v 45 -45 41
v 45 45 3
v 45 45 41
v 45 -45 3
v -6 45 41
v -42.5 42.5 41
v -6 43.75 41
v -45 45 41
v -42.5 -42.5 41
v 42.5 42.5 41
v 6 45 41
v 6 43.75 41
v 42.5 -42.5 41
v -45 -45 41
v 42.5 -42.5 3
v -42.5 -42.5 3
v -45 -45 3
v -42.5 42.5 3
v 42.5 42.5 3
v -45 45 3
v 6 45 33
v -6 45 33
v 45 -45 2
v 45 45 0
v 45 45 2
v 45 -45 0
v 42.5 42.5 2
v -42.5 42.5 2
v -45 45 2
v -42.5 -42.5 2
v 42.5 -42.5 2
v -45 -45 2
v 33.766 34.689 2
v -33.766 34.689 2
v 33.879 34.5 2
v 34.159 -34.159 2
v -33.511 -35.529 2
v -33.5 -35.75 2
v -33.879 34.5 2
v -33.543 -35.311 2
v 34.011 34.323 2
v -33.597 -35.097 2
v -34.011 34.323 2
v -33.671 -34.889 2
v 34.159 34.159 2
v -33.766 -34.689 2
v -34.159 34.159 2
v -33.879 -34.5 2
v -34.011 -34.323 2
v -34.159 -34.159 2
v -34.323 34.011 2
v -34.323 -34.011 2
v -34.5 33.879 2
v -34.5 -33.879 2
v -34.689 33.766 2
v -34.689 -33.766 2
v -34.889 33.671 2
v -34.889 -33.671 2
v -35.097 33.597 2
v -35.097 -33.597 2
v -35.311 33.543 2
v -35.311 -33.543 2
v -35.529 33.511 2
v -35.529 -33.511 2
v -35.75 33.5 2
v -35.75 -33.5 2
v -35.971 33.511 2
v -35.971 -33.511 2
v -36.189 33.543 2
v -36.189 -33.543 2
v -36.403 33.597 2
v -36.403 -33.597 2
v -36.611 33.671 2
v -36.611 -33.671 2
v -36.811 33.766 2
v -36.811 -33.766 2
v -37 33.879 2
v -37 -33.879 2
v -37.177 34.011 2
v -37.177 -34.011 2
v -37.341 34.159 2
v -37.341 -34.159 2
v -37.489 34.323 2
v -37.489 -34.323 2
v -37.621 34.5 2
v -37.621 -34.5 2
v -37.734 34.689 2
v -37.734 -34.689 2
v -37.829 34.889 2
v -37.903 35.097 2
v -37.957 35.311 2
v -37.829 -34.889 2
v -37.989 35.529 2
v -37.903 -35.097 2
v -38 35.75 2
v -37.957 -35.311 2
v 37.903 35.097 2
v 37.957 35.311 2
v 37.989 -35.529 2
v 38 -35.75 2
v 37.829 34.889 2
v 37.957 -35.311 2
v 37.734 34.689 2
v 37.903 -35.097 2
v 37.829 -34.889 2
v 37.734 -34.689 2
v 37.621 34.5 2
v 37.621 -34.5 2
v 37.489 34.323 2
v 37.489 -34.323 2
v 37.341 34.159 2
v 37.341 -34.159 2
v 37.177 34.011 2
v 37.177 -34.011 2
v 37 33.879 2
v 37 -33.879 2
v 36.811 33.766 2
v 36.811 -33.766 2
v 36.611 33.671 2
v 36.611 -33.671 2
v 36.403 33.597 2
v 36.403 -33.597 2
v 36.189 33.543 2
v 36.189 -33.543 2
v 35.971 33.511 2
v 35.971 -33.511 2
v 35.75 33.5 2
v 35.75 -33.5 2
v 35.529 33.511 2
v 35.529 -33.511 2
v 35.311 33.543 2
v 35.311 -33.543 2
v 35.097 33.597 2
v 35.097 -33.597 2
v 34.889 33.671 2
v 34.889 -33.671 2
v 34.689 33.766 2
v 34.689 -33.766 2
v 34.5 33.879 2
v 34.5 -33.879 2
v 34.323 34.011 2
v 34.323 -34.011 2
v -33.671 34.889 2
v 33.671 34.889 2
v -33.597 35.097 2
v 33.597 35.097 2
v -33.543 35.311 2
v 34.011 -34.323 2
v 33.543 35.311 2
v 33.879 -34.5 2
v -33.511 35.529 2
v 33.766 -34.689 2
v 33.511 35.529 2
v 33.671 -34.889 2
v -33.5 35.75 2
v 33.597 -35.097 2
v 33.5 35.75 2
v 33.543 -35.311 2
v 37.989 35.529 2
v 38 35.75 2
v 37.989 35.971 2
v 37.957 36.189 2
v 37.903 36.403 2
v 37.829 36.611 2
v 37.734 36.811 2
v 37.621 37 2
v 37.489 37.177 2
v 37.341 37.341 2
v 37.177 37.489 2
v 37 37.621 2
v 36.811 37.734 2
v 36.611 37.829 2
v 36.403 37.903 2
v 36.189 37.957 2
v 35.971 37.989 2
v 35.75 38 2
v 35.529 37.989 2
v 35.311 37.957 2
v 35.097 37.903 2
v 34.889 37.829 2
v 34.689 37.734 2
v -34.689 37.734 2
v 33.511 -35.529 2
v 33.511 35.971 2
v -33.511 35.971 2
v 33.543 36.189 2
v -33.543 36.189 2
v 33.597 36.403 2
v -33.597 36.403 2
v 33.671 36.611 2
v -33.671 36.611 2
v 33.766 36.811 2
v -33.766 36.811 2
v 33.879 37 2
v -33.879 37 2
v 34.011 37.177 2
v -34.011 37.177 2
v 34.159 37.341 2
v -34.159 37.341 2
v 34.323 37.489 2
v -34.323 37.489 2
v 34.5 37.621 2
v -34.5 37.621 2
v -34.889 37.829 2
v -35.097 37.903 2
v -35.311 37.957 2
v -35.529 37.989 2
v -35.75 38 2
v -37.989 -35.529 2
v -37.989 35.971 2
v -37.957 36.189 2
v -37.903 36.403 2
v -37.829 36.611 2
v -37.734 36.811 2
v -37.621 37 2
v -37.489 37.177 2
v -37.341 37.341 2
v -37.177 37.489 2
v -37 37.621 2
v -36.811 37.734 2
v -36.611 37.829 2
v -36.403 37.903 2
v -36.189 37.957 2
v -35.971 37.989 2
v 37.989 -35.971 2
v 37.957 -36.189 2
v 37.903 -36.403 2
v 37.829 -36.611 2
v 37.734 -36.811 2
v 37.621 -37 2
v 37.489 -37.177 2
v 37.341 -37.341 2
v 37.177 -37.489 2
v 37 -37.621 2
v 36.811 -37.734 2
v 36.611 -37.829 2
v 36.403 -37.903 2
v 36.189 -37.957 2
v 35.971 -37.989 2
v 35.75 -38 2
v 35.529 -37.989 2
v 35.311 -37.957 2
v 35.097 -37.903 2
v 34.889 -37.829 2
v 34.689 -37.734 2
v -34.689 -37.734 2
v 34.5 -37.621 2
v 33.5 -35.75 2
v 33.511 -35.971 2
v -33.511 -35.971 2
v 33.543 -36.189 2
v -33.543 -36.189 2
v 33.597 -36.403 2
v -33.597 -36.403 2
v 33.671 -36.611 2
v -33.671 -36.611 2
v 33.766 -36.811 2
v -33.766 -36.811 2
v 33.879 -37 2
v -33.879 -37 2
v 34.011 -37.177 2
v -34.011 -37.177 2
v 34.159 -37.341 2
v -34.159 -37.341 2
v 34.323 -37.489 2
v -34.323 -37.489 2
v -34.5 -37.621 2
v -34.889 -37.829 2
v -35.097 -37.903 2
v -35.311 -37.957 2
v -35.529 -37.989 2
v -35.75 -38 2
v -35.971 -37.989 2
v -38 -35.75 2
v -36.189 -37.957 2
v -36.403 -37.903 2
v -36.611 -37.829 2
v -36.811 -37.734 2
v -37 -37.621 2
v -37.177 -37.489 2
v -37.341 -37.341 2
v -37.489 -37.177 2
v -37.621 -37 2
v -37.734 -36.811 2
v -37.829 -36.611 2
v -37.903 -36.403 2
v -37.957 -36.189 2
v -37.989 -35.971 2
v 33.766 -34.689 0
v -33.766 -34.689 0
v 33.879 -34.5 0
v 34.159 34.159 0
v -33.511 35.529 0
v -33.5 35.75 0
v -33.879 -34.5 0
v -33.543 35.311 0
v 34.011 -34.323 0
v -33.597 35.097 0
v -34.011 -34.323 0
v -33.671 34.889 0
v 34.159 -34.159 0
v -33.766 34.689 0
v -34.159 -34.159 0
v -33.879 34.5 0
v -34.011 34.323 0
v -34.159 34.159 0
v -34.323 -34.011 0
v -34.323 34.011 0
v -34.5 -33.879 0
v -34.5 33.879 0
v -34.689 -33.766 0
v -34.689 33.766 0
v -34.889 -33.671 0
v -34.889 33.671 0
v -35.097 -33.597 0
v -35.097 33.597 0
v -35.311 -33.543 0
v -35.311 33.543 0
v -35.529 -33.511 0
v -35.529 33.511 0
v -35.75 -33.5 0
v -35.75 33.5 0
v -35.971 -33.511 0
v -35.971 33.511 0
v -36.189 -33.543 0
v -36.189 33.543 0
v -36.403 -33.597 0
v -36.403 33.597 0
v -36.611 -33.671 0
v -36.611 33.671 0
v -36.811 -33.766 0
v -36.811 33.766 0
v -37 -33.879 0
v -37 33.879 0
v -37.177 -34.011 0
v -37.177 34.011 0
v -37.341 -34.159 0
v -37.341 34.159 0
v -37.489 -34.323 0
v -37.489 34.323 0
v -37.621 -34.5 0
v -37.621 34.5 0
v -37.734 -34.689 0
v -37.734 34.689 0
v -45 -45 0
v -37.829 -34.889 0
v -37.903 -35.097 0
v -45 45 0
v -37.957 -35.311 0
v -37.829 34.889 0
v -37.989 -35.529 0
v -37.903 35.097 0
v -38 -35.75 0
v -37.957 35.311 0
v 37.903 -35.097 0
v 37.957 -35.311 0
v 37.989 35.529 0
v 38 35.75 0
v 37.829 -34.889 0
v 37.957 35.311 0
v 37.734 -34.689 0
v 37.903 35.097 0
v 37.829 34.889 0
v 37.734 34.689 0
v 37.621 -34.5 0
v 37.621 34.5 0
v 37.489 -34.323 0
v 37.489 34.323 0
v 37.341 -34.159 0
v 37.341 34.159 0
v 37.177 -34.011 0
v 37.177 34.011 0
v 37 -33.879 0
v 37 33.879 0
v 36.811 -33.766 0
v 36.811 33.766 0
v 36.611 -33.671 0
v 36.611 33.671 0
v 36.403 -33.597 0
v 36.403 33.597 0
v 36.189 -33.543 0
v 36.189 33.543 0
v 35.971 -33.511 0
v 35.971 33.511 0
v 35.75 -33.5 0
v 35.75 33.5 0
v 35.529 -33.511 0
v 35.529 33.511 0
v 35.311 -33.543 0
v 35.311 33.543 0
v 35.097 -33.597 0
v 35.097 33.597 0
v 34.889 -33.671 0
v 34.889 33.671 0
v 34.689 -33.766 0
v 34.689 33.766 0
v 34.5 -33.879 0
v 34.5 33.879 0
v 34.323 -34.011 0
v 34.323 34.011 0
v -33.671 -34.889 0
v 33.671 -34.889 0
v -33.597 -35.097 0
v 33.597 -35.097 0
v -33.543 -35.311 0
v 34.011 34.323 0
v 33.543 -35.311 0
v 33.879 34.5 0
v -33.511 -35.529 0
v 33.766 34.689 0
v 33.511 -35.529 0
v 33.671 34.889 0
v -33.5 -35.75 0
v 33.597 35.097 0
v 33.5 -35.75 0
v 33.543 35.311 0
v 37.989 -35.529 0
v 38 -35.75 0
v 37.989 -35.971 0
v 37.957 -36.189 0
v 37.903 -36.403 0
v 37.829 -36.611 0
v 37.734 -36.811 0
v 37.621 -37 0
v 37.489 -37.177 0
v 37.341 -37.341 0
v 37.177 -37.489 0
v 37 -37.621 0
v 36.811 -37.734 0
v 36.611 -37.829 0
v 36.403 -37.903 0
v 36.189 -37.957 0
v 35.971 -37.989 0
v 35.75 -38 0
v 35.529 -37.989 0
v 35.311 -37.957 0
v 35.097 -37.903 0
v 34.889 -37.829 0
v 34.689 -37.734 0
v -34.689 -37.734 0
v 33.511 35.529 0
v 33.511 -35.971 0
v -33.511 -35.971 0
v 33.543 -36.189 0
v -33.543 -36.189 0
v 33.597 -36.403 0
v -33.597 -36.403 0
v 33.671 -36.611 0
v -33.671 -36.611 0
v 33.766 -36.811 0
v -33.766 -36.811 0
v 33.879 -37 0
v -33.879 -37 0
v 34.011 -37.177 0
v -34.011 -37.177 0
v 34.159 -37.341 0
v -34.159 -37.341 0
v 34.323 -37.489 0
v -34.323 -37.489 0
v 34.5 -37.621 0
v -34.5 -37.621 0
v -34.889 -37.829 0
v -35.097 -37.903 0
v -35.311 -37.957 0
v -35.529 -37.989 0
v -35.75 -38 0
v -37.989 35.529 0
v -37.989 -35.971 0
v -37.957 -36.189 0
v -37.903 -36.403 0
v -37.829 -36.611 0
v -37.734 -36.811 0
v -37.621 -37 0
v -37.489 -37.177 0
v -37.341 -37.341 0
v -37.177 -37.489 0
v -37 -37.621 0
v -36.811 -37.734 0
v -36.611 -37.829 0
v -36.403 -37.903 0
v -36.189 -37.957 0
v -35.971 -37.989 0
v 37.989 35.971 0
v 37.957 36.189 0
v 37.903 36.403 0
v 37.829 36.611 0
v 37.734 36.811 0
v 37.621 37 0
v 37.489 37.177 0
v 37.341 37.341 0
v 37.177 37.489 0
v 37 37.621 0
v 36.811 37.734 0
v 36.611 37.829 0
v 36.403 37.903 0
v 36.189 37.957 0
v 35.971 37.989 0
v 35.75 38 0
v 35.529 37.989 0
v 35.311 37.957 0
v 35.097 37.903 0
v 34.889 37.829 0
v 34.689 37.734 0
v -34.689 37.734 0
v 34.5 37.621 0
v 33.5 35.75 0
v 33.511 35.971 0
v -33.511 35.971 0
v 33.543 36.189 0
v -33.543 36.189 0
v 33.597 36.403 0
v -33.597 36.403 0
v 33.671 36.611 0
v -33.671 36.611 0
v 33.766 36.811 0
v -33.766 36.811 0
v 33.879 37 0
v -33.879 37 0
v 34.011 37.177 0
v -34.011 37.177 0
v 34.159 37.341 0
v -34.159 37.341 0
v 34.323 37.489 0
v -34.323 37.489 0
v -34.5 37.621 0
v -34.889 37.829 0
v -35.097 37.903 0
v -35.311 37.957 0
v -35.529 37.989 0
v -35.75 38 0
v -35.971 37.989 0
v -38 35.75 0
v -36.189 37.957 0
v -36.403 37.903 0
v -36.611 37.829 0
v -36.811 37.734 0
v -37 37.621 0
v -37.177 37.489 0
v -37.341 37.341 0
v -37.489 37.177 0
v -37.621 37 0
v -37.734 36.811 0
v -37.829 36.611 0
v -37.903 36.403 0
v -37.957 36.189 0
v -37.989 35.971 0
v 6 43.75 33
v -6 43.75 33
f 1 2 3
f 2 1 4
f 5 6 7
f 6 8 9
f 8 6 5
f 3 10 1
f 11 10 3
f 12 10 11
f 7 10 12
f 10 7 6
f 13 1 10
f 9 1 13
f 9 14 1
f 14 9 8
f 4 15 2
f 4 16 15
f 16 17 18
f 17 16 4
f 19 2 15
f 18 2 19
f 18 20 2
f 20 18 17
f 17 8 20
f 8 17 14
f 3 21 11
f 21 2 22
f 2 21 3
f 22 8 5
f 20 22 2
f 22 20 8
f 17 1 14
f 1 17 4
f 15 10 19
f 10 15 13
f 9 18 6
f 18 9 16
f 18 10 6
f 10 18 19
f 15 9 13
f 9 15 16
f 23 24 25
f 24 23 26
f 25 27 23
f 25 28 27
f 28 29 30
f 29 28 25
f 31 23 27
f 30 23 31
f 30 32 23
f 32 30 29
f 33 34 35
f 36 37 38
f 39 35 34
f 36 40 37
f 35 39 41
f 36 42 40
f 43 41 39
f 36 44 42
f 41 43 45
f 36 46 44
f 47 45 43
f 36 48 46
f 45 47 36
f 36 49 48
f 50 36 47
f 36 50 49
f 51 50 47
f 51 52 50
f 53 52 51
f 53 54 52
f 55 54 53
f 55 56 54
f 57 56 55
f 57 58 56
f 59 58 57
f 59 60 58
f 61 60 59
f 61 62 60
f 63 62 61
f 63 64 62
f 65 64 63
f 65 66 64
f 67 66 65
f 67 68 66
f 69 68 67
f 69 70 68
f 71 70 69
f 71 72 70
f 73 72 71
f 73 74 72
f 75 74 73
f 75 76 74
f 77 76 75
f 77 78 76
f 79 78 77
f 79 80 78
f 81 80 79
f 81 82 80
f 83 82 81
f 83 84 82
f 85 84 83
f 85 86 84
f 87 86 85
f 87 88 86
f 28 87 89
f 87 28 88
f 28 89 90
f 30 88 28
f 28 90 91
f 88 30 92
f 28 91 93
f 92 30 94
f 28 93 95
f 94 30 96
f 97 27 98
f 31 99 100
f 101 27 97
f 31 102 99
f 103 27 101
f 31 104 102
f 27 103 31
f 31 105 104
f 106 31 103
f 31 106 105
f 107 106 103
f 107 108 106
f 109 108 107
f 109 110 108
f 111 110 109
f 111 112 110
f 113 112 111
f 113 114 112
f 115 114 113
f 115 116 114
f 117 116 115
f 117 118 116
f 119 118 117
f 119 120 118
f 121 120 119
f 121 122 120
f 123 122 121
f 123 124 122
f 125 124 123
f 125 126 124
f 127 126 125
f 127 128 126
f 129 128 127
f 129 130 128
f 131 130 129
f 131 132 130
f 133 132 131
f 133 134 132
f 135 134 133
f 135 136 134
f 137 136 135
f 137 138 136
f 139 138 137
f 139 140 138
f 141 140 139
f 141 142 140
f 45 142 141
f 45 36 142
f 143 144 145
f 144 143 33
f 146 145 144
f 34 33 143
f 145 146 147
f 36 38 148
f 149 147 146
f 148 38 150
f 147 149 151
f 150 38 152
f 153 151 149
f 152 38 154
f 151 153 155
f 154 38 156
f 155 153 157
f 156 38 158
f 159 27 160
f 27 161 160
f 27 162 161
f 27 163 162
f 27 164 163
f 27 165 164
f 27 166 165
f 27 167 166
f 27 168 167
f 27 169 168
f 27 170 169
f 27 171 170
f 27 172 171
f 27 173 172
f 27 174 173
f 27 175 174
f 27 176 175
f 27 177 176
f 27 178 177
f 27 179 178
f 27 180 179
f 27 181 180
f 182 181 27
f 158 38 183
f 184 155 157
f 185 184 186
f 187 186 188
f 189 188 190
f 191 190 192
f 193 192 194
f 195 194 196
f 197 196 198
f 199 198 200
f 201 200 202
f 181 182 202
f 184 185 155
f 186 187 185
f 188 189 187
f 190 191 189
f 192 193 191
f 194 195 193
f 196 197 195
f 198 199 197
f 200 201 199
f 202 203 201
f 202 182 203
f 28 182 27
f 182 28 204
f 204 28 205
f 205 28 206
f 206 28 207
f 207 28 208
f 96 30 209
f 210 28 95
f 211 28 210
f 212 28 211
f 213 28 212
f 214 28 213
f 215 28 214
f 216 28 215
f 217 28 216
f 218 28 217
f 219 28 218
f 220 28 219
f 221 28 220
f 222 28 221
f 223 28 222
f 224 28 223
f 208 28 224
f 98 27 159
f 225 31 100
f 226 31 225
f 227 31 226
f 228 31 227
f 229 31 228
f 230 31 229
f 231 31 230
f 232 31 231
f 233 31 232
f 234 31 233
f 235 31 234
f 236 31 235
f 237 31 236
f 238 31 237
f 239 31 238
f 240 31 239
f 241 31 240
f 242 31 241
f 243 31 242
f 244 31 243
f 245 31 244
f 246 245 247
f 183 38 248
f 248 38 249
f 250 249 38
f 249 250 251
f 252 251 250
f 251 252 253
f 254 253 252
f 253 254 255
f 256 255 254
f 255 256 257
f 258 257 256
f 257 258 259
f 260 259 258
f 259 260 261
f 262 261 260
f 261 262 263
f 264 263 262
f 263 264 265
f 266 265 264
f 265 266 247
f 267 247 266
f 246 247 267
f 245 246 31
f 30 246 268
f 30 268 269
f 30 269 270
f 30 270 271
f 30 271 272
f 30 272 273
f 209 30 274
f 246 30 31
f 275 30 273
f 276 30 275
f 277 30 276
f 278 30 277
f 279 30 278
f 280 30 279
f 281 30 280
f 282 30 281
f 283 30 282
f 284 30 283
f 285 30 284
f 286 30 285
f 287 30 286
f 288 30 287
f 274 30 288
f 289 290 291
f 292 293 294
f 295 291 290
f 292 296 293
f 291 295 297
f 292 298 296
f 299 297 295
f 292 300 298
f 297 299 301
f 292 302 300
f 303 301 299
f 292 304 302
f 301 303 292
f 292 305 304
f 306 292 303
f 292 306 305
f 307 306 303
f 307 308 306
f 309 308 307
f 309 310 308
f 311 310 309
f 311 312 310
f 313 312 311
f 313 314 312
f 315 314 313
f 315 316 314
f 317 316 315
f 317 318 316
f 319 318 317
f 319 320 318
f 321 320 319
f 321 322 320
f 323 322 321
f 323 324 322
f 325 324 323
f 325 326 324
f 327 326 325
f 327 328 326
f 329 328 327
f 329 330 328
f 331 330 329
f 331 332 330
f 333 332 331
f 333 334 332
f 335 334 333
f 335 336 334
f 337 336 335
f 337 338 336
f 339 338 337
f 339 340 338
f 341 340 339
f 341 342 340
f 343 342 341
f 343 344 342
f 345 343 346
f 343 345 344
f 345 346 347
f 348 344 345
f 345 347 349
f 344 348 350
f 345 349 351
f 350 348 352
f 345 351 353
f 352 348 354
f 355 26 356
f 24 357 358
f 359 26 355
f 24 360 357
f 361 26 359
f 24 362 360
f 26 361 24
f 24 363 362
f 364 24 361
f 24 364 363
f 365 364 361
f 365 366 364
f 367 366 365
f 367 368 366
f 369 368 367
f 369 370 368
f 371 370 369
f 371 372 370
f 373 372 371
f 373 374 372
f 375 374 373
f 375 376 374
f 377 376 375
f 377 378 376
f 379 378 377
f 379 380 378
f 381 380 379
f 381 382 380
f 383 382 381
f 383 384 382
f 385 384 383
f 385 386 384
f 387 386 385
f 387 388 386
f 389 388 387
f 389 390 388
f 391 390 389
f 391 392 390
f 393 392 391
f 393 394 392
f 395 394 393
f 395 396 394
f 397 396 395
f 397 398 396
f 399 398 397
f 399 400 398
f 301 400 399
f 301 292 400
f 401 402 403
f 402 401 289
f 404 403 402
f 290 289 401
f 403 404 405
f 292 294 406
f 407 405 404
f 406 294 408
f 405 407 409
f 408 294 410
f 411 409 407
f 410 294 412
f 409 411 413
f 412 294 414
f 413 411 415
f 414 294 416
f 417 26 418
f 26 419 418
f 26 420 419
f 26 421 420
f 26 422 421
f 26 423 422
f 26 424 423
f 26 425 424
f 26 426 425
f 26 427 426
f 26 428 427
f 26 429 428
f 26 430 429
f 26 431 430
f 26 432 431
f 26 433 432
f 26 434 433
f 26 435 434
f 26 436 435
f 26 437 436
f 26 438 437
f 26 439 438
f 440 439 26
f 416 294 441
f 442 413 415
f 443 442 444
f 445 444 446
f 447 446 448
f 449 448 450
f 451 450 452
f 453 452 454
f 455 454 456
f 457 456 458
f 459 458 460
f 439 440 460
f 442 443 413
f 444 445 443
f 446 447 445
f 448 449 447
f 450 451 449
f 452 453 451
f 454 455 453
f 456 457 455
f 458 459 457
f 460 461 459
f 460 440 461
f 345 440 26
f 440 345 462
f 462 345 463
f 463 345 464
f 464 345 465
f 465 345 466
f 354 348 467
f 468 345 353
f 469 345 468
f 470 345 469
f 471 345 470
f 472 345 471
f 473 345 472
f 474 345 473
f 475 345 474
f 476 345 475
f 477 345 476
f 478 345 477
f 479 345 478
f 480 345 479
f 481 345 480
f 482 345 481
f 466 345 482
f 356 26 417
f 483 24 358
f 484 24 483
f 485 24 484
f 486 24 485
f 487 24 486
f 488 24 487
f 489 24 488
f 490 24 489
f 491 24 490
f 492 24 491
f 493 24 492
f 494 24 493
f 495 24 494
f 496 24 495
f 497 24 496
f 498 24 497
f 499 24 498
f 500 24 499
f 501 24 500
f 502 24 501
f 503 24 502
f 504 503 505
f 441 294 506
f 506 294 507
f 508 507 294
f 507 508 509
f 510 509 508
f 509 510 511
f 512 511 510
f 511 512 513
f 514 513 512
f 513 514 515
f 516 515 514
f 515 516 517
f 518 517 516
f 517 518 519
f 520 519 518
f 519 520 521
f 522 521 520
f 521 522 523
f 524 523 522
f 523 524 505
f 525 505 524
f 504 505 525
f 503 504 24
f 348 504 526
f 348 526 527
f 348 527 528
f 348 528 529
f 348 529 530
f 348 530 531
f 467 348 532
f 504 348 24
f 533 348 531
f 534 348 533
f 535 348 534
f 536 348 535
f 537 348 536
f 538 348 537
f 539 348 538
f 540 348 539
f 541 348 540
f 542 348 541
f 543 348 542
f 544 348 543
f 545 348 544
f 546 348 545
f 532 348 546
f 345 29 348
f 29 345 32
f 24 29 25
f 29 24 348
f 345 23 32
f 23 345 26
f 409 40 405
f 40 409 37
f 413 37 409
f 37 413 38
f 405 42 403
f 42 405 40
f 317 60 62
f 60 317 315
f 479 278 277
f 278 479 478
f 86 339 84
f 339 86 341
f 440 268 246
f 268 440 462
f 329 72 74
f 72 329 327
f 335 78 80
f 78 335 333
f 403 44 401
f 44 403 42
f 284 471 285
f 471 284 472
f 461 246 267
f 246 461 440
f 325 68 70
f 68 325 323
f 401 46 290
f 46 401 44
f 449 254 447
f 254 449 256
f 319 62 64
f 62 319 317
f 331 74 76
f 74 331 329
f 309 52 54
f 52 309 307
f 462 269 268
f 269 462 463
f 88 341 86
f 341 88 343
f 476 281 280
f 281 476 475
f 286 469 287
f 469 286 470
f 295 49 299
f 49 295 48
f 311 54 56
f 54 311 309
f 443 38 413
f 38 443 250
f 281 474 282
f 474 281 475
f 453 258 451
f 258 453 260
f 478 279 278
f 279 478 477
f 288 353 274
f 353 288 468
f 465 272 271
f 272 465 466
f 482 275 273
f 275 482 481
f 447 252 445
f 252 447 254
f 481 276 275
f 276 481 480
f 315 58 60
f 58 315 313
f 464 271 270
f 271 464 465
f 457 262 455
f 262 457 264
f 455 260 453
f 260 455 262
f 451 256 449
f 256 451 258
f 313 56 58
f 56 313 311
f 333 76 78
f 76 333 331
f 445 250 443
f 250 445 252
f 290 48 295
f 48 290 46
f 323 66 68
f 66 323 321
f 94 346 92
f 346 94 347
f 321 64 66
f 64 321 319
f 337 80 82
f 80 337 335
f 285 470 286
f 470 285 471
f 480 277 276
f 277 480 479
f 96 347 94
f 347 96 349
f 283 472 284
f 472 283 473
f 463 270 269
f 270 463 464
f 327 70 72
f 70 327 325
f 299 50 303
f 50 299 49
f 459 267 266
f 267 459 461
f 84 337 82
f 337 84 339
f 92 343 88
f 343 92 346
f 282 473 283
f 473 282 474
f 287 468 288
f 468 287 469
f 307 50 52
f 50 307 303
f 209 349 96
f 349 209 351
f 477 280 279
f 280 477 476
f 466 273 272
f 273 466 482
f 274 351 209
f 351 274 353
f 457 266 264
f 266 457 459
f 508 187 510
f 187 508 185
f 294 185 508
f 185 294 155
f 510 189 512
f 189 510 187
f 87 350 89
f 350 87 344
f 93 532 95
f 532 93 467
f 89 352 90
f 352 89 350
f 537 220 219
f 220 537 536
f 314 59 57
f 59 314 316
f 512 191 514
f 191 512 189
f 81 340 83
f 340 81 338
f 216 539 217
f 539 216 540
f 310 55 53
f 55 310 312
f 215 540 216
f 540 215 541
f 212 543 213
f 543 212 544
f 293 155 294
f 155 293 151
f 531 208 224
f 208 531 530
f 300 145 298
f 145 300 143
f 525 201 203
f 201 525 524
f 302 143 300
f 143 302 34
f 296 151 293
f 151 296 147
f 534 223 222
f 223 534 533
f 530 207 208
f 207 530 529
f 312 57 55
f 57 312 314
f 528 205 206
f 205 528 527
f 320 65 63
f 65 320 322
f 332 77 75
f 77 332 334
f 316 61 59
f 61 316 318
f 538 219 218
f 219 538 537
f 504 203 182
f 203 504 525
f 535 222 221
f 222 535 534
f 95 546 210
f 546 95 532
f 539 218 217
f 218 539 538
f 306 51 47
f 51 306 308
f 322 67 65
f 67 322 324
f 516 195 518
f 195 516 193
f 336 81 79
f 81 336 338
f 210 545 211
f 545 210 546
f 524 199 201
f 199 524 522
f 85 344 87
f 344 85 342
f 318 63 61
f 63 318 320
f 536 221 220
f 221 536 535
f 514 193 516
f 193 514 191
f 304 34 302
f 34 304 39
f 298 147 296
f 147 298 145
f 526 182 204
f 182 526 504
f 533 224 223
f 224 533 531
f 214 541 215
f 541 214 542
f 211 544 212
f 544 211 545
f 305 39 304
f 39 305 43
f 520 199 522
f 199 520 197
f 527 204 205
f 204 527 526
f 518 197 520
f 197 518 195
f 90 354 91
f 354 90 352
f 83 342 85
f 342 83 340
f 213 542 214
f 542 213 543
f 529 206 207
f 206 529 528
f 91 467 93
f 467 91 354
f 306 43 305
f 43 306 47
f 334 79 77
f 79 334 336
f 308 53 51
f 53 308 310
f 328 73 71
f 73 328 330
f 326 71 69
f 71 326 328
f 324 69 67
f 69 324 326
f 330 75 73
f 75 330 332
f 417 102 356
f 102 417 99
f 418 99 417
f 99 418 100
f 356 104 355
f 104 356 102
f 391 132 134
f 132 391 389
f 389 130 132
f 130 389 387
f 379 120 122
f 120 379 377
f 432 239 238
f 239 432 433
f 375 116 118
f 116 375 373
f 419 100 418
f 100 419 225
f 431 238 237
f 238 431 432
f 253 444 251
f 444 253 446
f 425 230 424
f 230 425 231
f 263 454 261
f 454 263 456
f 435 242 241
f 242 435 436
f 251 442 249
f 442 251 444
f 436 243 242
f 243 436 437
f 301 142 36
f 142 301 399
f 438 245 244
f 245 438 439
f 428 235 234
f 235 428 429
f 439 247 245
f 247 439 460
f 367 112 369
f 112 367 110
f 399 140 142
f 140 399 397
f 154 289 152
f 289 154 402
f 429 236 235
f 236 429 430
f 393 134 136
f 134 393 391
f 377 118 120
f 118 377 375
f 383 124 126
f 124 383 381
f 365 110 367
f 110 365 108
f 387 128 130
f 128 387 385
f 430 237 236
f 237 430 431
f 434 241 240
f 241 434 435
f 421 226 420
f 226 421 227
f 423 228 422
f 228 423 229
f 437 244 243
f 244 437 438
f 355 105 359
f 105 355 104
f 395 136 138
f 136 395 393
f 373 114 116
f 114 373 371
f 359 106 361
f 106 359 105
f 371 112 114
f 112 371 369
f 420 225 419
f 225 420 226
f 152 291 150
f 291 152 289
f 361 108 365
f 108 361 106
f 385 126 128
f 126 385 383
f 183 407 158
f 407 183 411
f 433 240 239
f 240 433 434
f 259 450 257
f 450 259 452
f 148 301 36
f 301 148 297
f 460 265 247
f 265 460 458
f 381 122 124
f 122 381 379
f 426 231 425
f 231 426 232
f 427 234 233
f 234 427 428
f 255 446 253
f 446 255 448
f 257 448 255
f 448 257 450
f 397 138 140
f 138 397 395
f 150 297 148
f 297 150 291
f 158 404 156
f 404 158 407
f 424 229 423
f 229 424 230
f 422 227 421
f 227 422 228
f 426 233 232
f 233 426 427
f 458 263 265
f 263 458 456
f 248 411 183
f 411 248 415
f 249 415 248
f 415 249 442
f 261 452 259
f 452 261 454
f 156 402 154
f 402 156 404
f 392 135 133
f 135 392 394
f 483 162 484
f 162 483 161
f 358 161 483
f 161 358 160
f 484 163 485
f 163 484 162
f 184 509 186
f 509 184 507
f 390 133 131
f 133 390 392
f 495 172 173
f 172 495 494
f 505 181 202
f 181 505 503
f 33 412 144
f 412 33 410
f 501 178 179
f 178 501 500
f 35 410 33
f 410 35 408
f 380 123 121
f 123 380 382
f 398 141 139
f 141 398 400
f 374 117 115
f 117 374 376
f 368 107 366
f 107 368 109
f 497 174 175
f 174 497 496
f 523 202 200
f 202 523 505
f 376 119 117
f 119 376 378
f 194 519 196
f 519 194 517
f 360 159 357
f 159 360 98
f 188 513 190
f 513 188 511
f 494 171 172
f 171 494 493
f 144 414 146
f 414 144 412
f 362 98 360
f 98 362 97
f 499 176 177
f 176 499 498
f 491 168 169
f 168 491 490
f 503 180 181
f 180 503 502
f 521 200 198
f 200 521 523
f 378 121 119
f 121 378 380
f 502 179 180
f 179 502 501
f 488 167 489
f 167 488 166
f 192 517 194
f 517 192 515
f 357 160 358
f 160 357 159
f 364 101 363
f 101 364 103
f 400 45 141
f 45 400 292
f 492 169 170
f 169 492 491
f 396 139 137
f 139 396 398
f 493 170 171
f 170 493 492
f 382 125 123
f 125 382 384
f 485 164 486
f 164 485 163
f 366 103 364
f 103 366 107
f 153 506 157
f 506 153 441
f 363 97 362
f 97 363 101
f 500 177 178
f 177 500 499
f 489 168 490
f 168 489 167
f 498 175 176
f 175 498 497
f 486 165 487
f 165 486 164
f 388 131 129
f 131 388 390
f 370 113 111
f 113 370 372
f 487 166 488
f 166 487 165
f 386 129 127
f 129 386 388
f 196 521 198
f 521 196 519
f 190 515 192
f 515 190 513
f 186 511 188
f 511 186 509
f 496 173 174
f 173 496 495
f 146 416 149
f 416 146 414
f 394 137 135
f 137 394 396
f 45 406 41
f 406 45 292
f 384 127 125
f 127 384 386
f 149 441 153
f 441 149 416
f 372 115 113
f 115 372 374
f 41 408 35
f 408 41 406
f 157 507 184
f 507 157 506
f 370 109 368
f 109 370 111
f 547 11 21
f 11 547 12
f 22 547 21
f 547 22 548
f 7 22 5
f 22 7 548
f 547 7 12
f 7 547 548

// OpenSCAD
// Magnetic Stirrer Housing
// Designed for an 80mm PC fan.
// Print orientation: Top plate on the bed (z=0).
// Centered on X and Y.

// Dimensions
outer_dim      = 90.0;    // Outer width and length (mm)
top_thickness  = 2.0;     // Thickness of the top plate (mm)
wall_thickness = 2.5;     // Thickness of the four walls (mm)
total_height   = 40.0;    // Total height from top plate to open edge (mm)
hole_diam      = 4.5;     // Diameter of M4 screw holes (mm)
hole_pattern   = 71.5;    // Square pattern for fan mounting holes (mm)
notch_width    = 12.0;    // Width of the cable notch (mm)
notch_depth    = 8.0;     // Depth of the notch from the open edge (mm)

$fn = 64;

// Calculations
wall_height = total_height - top_thickness;

module housing() {
    difference() {
        // --- MAIN BODY ---
        union() {
            // The top plate (z=0 to z=2)
            cube([outer_dim, outer_dim, top_thickness], center = true);
            
            // The four walls (z=2 to z=40)
            // We use a hull or a union of cubes to create the wall structure
            translate([0, 0, top_thickness + wall_height / 2]) {
                difference() {
                    // Outer boundary of walls
                    cube([outer_dim, outer_dim, wall_height], center = true);
                    // Inner cavity (to be hollowed out)
                    cube([outer_dim - 2 * wall_thickness, outer_dim - 2 * wall_thickness, wall_height + 2], center = true);
                }
            }
        }

        // --- SUBTRACTIONS ---

        // 1. The Cavity (to make it an open box)
        // This hollows out the space above the top plate
        translate([0, 0, top_thickness + wall_height / 2])
            cube([outer_dim - 2 * wall_thickness, outer_dim - 2 * wall_thickness, wall_height + 2], center = true);

        // 2. Screw Holes (M4)
        // Pattern is 71.5mm square, centered.
        // Holes go through the top plate (z=0 to z=2)
        for (sx = [-1, 1], sy = [-1, 1]) {
            translate([sx * hole_pattern / 2, sy * hole_pattern / 2, -1])
                cylinder(h = top_thickness + 2, d = hole_diam);
        }

        // 3. Cable Notch
        // Centered along one wall, reaching 8mm down from the open edge.
        // Open edge is at Z = 40. Notch is from Z = 32 to Z = 40.
        // We place it on the wall at +Y (Y = outer_dim/2).
        // The notch cuts through the wall thickness.
        translate([-notch_width / 2, outer_dim / 2 - wall_thickness / 2, total_height - notch_depth])
            cube([notch_width, wall_thickness + 1, notch_depth + 1]);
    }
}

// Execute module
// The module is already designed with center=true for X and Y.
// To ensure the bottom of the plate is at Z=0, we must translate the whole object.
// Since the top plate is 2mm thick and centered at Z=0, its bottom is at Z=-1.
// We translate by +1 to put the bottom at Z=0.
translate([0, 0, 1]) housing();
